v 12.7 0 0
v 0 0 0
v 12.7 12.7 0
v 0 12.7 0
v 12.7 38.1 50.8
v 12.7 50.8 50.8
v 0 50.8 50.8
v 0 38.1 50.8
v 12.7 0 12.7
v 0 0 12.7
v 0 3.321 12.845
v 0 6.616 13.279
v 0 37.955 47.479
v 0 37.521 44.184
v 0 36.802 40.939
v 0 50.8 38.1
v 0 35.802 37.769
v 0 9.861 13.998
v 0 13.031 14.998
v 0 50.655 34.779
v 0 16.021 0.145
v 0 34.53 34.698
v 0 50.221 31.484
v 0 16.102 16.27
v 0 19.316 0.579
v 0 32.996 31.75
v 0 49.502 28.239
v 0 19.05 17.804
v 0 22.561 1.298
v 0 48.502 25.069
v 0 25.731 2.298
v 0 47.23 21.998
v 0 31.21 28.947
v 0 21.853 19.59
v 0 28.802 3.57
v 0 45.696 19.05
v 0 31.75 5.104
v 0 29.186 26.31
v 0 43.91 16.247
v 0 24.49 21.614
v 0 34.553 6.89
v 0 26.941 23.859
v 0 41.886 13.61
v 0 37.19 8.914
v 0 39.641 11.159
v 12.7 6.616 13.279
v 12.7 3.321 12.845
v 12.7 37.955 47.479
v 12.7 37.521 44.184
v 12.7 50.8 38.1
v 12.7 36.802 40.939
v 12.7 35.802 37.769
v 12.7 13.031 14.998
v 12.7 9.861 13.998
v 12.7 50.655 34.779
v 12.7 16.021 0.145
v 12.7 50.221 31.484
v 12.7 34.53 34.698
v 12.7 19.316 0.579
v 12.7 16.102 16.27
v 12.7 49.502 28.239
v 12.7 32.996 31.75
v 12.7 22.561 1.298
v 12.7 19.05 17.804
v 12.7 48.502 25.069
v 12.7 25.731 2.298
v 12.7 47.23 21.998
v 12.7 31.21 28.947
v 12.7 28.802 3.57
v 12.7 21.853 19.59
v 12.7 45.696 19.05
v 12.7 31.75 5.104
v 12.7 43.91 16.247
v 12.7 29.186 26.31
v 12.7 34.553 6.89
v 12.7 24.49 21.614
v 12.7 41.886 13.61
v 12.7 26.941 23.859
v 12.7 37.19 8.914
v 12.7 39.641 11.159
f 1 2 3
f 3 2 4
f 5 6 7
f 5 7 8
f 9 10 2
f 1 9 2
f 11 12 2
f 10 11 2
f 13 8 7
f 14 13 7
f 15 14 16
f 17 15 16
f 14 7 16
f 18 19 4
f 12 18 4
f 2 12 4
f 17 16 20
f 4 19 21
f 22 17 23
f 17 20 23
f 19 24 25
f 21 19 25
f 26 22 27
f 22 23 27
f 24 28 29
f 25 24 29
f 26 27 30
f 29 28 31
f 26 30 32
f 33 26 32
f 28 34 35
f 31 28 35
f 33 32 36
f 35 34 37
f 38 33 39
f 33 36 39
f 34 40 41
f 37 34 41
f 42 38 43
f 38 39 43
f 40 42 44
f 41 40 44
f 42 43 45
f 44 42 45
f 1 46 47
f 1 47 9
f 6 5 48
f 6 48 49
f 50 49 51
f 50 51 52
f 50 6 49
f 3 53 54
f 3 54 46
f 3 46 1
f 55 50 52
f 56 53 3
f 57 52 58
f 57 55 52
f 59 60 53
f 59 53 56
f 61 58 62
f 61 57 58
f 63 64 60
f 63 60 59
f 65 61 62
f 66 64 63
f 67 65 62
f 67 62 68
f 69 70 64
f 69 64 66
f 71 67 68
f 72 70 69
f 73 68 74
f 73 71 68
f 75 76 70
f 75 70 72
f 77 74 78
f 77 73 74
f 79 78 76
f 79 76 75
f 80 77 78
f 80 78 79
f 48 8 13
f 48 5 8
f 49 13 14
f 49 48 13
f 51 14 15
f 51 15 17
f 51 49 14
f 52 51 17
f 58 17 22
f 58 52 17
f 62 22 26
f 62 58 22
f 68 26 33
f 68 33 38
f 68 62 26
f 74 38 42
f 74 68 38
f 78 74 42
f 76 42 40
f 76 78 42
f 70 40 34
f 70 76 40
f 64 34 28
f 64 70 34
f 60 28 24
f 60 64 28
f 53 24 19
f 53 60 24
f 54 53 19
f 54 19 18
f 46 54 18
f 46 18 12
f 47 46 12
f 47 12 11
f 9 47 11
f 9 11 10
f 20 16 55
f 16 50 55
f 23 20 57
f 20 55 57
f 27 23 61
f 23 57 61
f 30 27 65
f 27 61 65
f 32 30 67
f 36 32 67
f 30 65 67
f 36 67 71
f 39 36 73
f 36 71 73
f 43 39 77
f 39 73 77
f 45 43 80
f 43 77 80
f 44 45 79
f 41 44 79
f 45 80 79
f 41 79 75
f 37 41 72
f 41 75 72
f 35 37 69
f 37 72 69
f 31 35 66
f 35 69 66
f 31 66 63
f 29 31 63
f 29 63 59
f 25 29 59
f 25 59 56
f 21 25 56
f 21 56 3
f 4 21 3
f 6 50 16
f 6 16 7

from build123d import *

# Parameters (mm, degrees)
BOSS_EXTRUDE1_DEPTH = 12.7
FILLET1_R           = 38.1
FILLET2_R           = 38.1


with BuildPart() as part:
    # Sketch1 → Boss-Extrude1 (new body)
    with BuildSketch(Plane(origin=(0, 0, 0), x_dir=(0, 0, -1), z_dir=(1, 0, 0))):
        Polygon((0, 0), (0, 50.8), (-50.8, 50.8), (-50.8, 38.1), (-12.7, 38.1), (-12.7, 0), align=None)
    extrude(amount=BOSS_EXTRUDE1_DEPTH)

    # Fillet1
    fillet1_edges = [part.edges().sort_by_distance(p)[0] for p in [
        (6.35, 38.1, 12.7),
    ]]
    fillet(fillet1_edges, radius=FILLET1_R - 0.0001)  # a hair under: the kernel refuses the full size

    # Fillet2
    fillet2_edges = [part.edges().sort_by_distance(p)[0] for p in [
        (6.35, 50.8, 0),
    ]]
    fillet(fillet2_edges, radius=FILLET2_R)


solid = part.part
